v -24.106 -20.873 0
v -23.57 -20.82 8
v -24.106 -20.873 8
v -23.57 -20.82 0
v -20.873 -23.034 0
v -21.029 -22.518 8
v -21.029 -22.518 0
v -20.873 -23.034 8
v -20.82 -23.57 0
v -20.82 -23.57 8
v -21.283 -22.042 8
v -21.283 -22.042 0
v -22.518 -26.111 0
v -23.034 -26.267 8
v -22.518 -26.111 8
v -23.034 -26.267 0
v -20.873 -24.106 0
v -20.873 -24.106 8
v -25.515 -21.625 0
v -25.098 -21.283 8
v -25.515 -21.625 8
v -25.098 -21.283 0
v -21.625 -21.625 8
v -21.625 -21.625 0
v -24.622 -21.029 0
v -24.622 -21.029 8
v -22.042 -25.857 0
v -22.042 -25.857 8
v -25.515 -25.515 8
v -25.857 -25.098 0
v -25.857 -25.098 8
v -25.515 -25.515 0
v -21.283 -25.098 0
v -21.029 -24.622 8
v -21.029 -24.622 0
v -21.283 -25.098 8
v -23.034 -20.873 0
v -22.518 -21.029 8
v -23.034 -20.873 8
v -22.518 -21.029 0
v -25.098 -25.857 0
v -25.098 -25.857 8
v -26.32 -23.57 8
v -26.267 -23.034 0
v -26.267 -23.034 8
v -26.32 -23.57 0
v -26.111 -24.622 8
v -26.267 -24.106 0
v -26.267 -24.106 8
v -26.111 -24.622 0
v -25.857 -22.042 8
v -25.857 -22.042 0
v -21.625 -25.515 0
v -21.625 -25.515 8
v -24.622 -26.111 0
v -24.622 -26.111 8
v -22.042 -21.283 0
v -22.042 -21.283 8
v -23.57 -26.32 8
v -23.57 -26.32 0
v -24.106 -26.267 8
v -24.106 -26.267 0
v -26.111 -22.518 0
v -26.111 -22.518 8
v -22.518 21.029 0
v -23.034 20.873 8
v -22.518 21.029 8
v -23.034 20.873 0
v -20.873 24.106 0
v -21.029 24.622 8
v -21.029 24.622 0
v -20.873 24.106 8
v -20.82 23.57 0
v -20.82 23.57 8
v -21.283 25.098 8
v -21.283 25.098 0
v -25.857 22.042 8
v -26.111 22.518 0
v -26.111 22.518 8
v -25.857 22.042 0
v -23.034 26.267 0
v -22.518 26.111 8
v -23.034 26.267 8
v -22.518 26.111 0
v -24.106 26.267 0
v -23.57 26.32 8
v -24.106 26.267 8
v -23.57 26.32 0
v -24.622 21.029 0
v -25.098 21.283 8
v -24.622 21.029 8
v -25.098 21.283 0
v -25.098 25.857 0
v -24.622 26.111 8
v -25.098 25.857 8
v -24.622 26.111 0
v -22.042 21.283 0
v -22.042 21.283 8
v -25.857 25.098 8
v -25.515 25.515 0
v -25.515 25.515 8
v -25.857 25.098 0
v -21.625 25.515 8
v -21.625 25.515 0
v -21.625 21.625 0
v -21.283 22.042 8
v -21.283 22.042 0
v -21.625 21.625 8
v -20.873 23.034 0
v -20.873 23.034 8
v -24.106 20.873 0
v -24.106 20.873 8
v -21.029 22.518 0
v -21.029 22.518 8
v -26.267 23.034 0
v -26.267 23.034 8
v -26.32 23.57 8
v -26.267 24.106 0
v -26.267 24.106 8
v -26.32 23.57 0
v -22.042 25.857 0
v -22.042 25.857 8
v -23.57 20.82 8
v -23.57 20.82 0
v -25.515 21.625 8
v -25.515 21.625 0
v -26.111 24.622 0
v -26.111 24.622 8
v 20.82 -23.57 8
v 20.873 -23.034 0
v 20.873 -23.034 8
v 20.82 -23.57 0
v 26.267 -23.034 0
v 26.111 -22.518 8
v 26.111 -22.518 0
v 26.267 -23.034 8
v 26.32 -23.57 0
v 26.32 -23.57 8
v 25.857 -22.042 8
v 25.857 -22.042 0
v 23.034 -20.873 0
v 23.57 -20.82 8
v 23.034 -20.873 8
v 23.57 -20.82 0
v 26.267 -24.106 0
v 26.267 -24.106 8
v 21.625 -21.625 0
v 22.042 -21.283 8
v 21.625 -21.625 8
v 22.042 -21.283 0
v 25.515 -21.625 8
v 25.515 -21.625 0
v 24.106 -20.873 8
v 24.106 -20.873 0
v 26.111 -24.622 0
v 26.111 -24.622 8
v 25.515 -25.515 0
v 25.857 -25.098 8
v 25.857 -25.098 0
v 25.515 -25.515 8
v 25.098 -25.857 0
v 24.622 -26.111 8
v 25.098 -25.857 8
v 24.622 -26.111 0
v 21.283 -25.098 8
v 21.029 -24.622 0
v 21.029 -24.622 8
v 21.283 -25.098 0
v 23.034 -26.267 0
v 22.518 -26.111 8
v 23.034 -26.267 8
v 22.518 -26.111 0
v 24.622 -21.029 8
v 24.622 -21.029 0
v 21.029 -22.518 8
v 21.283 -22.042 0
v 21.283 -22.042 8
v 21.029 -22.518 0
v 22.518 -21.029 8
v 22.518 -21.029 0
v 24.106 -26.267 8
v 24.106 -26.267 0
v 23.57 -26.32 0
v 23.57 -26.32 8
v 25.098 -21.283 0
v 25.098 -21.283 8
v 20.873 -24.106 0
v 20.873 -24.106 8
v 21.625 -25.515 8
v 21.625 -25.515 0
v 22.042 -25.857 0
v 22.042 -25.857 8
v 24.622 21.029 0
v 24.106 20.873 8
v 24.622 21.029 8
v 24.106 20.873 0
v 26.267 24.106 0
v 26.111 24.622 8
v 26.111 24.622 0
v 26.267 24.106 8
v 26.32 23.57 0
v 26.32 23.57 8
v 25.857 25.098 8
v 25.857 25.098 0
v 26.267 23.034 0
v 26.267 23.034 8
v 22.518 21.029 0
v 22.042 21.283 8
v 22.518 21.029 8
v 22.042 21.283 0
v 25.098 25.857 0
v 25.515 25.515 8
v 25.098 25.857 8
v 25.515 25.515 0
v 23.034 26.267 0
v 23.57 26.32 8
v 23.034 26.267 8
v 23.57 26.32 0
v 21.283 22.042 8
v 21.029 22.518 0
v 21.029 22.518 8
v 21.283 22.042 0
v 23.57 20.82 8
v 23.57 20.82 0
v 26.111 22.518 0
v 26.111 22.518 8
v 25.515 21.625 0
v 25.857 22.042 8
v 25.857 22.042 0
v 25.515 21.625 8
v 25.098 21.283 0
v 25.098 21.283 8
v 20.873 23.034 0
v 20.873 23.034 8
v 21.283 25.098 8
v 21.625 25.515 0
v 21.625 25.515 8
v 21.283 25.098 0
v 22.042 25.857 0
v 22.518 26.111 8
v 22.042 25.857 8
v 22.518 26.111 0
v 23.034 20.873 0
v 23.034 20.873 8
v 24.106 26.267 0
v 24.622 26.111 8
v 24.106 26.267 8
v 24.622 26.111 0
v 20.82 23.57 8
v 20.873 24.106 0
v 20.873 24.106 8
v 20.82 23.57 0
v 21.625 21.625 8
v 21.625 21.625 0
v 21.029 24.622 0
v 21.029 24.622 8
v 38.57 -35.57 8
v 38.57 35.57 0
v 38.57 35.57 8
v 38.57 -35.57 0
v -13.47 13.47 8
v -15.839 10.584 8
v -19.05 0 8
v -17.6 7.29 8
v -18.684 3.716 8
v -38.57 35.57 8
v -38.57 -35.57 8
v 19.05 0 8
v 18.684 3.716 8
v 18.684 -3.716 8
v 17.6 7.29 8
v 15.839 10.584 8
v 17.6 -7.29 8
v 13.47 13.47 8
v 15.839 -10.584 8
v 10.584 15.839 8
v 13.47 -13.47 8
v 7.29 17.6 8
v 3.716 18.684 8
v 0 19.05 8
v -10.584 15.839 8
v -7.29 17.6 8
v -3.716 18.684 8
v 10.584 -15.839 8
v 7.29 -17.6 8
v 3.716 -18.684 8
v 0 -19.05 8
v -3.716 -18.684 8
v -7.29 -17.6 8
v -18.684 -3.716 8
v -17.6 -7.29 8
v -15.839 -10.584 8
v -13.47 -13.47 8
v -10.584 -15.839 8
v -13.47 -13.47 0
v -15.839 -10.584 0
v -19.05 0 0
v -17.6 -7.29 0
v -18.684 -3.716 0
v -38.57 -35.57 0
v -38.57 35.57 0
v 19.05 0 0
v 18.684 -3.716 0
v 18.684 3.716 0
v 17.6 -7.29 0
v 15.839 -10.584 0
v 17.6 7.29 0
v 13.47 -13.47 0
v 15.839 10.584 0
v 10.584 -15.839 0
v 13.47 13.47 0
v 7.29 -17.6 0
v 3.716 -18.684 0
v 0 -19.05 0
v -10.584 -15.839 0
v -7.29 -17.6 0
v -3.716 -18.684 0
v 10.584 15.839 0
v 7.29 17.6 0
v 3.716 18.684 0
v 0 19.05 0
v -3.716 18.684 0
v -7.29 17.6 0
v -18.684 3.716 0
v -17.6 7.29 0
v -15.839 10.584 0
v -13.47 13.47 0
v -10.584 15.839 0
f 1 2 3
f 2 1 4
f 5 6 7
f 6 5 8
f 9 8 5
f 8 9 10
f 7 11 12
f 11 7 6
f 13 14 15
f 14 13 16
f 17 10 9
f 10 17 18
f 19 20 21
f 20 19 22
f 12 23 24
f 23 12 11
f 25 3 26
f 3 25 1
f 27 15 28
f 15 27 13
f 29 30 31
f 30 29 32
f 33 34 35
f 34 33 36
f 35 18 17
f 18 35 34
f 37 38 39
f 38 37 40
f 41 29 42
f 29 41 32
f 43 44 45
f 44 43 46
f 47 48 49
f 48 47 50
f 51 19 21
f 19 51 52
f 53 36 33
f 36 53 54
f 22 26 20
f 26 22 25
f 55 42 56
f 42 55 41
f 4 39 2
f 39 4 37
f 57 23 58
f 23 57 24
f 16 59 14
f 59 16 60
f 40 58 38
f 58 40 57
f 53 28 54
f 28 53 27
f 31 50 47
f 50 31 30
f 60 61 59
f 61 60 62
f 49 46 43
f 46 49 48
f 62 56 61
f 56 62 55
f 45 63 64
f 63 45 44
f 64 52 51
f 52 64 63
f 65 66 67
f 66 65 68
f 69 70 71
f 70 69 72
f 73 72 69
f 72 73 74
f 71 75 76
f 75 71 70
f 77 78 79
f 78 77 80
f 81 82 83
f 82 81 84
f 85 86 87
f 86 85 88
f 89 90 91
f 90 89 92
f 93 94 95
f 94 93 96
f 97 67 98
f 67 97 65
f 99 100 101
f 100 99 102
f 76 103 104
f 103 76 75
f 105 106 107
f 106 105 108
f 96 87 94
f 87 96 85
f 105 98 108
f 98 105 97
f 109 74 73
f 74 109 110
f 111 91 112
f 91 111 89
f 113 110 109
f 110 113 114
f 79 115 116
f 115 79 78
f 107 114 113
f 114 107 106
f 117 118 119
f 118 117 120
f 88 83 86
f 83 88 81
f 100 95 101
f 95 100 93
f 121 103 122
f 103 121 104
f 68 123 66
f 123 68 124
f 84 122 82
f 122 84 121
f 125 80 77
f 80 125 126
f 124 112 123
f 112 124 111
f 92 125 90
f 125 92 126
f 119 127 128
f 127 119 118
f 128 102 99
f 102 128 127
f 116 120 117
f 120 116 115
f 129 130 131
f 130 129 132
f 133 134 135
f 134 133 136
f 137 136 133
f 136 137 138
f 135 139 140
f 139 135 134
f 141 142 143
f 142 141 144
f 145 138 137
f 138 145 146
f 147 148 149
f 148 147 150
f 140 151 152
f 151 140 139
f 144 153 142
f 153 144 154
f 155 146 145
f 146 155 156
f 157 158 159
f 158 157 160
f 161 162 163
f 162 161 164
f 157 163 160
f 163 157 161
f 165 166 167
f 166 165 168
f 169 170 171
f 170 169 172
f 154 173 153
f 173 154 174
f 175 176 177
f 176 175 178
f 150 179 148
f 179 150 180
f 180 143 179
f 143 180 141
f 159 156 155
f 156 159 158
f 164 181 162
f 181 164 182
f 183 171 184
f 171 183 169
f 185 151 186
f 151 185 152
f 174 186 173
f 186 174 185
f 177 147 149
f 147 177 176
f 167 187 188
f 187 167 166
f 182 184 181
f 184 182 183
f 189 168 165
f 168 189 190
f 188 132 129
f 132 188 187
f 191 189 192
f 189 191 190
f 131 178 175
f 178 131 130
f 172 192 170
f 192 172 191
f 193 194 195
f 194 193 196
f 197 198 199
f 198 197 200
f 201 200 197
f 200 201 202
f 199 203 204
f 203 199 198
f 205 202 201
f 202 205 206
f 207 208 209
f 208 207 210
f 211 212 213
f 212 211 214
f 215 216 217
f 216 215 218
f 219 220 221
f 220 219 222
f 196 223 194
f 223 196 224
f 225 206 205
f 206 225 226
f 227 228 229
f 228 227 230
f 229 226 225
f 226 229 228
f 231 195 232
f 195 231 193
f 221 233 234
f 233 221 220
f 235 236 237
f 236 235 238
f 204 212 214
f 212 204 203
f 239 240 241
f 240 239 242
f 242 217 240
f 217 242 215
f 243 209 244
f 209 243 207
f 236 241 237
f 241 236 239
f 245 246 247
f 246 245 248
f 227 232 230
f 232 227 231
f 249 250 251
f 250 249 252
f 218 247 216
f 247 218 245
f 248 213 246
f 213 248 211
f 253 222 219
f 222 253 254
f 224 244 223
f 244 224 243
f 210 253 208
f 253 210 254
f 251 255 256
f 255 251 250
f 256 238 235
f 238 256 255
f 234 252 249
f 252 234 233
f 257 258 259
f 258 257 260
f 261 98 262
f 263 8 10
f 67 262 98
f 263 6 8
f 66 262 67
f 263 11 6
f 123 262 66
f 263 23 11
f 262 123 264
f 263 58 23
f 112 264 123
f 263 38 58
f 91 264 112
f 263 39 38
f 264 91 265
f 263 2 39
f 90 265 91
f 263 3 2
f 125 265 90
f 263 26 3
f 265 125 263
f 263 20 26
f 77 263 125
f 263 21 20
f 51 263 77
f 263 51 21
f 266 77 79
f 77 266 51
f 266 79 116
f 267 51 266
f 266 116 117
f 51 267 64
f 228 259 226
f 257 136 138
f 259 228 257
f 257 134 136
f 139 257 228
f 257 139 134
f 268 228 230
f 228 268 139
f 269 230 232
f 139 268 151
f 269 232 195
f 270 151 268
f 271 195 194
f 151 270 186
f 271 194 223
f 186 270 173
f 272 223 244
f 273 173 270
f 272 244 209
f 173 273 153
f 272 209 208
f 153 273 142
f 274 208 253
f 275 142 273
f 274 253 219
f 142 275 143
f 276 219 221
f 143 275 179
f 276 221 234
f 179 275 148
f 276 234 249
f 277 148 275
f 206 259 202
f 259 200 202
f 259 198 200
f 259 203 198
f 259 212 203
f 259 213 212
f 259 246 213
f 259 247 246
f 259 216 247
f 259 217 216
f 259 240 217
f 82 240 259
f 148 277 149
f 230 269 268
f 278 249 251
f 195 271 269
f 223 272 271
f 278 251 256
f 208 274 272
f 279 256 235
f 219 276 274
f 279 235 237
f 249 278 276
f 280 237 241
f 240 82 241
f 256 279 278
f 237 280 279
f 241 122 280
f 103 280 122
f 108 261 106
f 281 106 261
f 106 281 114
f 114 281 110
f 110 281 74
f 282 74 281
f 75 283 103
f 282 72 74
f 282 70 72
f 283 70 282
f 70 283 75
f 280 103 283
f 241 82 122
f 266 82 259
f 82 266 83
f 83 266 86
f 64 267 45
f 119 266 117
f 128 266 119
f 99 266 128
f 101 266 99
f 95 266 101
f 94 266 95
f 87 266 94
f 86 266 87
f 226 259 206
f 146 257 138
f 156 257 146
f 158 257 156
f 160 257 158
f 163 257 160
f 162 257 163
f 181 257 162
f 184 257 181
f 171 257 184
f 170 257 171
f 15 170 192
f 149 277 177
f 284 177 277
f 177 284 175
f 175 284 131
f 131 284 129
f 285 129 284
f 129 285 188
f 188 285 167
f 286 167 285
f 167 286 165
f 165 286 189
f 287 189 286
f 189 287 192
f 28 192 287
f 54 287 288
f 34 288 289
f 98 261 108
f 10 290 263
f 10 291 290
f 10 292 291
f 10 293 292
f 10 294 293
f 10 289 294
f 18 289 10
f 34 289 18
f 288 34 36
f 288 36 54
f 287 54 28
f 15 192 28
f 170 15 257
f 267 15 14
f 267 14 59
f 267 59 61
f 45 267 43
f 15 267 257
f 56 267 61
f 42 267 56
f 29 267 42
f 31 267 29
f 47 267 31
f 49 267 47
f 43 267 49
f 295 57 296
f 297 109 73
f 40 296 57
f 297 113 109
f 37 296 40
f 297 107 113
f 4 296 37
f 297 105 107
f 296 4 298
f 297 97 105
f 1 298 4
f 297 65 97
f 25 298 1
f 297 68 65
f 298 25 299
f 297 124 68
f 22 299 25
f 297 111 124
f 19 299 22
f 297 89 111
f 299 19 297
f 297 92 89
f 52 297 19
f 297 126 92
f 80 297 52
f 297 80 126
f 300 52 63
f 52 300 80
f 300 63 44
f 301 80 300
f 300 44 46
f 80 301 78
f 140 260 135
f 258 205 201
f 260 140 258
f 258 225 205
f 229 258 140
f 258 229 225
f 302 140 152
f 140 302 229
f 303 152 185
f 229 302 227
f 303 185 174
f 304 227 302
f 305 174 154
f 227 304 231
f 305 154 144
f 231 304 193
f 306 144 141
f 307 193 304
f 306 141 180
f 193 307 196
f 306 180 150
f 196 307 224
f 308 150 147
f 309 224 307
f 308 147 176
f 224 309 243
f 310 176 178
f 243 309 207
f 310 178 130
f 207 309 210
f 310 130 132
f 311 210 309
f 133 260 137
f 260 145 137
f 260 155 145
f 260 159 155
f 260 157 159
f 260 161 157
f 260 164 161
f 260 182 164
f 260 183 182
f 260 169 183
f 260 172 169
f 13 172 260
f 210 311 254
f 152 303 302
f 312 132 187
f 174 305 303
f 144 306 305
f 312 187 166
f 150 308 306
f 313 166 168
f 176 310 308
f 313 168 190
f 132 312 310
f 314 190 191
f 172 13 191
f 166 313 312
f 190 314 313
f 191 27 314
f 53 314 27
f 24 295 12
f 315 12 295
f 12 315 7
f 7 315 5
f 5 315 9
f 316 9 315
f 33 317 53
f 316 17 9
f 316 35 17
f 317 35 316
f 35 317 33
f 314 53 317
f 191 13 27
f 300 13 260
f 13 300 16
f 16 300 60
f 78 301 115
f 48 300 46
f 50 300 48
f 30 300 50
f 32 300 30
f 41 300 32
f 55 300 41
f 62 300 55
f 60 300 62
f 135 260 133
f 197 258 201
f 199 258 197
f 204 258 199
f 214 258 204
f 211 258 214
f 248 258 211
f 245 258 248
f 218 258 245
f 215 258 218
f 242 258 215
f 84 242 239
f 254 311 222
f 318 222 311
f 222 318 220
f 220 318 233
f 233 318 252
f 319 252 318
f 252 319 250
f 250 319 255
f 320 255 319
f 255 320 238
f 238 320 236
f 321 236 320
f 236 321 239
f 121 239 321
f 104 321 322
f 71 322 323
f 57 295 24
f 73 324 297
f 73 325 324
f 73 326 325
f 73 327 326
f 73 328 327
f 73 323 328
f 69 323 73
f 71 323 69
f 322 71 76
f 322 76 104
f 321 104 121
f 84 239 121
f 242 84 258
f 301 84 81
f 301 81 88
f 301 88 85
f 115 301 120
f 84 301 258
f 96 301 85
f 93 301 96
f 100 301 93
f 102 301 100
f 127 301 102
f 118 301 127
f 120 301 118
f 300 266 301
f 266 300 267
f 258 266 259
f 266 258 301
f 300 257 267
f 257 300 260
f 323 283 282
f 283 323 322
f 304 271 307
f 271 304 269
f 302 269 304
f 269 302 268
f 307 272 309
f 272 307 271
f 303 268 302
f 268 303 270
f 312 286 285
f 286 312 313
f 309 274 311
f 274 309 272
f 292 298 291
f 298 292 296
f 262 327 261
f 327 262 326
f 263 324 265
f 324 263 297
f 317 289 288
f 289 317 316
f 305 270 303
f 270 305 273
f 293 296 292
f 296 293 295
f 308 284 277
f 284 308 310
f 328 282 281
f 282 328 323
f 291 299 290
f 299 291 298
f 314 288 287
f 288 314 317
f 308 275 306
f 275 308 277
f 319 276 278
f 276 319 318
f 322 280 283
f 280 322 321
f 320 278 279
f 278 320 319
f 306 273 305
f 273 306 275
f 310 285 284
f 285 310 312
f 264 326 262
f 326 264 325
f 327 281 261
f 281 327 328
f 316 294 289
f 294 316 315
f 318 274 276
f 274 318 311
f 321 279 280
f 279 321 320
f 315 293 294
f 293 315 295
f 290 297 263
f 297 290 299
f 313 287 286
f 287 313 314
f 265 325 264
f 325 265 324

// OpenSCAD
$fn = 32;

// ----------------------------------------------------------------------
// Motor mount plate: NEMA23, 77.14 x 71.14 x 8 mm
// ----------------------------------------------------------------------

// --- parameters (mm) ---
plate_w = 77.14;          // plate length, X
plate_d = 71.14;          // plate width, Y
plate_t = 8;              // plate thickness
pattern = 47.14;          // NEMA23 bolt spacing
motor_d = 5.5;            // NEMA23 screw clearance
pilot_d = 38.1;           // pilot boss bore

module plate() {
  translate([-plate_w / 2, -plate_d / 2, 0]) cube([plate_w, plate_d, plate_t]);
}

module motor_holes() {
  for (sx = [-1, 1]) for (sy = [-1, 1])
    translate([sx * pattern / 2, sy * pattern / 2, -1])
      cylinder(h = plate_t + 2, d = motor_d);
}

difference() {
  union() {
    plate();
  }
  motor_holes();
  translate([0, 0, -1]) cylinder(h = plate_t + 2, d = pilot_d);
}
